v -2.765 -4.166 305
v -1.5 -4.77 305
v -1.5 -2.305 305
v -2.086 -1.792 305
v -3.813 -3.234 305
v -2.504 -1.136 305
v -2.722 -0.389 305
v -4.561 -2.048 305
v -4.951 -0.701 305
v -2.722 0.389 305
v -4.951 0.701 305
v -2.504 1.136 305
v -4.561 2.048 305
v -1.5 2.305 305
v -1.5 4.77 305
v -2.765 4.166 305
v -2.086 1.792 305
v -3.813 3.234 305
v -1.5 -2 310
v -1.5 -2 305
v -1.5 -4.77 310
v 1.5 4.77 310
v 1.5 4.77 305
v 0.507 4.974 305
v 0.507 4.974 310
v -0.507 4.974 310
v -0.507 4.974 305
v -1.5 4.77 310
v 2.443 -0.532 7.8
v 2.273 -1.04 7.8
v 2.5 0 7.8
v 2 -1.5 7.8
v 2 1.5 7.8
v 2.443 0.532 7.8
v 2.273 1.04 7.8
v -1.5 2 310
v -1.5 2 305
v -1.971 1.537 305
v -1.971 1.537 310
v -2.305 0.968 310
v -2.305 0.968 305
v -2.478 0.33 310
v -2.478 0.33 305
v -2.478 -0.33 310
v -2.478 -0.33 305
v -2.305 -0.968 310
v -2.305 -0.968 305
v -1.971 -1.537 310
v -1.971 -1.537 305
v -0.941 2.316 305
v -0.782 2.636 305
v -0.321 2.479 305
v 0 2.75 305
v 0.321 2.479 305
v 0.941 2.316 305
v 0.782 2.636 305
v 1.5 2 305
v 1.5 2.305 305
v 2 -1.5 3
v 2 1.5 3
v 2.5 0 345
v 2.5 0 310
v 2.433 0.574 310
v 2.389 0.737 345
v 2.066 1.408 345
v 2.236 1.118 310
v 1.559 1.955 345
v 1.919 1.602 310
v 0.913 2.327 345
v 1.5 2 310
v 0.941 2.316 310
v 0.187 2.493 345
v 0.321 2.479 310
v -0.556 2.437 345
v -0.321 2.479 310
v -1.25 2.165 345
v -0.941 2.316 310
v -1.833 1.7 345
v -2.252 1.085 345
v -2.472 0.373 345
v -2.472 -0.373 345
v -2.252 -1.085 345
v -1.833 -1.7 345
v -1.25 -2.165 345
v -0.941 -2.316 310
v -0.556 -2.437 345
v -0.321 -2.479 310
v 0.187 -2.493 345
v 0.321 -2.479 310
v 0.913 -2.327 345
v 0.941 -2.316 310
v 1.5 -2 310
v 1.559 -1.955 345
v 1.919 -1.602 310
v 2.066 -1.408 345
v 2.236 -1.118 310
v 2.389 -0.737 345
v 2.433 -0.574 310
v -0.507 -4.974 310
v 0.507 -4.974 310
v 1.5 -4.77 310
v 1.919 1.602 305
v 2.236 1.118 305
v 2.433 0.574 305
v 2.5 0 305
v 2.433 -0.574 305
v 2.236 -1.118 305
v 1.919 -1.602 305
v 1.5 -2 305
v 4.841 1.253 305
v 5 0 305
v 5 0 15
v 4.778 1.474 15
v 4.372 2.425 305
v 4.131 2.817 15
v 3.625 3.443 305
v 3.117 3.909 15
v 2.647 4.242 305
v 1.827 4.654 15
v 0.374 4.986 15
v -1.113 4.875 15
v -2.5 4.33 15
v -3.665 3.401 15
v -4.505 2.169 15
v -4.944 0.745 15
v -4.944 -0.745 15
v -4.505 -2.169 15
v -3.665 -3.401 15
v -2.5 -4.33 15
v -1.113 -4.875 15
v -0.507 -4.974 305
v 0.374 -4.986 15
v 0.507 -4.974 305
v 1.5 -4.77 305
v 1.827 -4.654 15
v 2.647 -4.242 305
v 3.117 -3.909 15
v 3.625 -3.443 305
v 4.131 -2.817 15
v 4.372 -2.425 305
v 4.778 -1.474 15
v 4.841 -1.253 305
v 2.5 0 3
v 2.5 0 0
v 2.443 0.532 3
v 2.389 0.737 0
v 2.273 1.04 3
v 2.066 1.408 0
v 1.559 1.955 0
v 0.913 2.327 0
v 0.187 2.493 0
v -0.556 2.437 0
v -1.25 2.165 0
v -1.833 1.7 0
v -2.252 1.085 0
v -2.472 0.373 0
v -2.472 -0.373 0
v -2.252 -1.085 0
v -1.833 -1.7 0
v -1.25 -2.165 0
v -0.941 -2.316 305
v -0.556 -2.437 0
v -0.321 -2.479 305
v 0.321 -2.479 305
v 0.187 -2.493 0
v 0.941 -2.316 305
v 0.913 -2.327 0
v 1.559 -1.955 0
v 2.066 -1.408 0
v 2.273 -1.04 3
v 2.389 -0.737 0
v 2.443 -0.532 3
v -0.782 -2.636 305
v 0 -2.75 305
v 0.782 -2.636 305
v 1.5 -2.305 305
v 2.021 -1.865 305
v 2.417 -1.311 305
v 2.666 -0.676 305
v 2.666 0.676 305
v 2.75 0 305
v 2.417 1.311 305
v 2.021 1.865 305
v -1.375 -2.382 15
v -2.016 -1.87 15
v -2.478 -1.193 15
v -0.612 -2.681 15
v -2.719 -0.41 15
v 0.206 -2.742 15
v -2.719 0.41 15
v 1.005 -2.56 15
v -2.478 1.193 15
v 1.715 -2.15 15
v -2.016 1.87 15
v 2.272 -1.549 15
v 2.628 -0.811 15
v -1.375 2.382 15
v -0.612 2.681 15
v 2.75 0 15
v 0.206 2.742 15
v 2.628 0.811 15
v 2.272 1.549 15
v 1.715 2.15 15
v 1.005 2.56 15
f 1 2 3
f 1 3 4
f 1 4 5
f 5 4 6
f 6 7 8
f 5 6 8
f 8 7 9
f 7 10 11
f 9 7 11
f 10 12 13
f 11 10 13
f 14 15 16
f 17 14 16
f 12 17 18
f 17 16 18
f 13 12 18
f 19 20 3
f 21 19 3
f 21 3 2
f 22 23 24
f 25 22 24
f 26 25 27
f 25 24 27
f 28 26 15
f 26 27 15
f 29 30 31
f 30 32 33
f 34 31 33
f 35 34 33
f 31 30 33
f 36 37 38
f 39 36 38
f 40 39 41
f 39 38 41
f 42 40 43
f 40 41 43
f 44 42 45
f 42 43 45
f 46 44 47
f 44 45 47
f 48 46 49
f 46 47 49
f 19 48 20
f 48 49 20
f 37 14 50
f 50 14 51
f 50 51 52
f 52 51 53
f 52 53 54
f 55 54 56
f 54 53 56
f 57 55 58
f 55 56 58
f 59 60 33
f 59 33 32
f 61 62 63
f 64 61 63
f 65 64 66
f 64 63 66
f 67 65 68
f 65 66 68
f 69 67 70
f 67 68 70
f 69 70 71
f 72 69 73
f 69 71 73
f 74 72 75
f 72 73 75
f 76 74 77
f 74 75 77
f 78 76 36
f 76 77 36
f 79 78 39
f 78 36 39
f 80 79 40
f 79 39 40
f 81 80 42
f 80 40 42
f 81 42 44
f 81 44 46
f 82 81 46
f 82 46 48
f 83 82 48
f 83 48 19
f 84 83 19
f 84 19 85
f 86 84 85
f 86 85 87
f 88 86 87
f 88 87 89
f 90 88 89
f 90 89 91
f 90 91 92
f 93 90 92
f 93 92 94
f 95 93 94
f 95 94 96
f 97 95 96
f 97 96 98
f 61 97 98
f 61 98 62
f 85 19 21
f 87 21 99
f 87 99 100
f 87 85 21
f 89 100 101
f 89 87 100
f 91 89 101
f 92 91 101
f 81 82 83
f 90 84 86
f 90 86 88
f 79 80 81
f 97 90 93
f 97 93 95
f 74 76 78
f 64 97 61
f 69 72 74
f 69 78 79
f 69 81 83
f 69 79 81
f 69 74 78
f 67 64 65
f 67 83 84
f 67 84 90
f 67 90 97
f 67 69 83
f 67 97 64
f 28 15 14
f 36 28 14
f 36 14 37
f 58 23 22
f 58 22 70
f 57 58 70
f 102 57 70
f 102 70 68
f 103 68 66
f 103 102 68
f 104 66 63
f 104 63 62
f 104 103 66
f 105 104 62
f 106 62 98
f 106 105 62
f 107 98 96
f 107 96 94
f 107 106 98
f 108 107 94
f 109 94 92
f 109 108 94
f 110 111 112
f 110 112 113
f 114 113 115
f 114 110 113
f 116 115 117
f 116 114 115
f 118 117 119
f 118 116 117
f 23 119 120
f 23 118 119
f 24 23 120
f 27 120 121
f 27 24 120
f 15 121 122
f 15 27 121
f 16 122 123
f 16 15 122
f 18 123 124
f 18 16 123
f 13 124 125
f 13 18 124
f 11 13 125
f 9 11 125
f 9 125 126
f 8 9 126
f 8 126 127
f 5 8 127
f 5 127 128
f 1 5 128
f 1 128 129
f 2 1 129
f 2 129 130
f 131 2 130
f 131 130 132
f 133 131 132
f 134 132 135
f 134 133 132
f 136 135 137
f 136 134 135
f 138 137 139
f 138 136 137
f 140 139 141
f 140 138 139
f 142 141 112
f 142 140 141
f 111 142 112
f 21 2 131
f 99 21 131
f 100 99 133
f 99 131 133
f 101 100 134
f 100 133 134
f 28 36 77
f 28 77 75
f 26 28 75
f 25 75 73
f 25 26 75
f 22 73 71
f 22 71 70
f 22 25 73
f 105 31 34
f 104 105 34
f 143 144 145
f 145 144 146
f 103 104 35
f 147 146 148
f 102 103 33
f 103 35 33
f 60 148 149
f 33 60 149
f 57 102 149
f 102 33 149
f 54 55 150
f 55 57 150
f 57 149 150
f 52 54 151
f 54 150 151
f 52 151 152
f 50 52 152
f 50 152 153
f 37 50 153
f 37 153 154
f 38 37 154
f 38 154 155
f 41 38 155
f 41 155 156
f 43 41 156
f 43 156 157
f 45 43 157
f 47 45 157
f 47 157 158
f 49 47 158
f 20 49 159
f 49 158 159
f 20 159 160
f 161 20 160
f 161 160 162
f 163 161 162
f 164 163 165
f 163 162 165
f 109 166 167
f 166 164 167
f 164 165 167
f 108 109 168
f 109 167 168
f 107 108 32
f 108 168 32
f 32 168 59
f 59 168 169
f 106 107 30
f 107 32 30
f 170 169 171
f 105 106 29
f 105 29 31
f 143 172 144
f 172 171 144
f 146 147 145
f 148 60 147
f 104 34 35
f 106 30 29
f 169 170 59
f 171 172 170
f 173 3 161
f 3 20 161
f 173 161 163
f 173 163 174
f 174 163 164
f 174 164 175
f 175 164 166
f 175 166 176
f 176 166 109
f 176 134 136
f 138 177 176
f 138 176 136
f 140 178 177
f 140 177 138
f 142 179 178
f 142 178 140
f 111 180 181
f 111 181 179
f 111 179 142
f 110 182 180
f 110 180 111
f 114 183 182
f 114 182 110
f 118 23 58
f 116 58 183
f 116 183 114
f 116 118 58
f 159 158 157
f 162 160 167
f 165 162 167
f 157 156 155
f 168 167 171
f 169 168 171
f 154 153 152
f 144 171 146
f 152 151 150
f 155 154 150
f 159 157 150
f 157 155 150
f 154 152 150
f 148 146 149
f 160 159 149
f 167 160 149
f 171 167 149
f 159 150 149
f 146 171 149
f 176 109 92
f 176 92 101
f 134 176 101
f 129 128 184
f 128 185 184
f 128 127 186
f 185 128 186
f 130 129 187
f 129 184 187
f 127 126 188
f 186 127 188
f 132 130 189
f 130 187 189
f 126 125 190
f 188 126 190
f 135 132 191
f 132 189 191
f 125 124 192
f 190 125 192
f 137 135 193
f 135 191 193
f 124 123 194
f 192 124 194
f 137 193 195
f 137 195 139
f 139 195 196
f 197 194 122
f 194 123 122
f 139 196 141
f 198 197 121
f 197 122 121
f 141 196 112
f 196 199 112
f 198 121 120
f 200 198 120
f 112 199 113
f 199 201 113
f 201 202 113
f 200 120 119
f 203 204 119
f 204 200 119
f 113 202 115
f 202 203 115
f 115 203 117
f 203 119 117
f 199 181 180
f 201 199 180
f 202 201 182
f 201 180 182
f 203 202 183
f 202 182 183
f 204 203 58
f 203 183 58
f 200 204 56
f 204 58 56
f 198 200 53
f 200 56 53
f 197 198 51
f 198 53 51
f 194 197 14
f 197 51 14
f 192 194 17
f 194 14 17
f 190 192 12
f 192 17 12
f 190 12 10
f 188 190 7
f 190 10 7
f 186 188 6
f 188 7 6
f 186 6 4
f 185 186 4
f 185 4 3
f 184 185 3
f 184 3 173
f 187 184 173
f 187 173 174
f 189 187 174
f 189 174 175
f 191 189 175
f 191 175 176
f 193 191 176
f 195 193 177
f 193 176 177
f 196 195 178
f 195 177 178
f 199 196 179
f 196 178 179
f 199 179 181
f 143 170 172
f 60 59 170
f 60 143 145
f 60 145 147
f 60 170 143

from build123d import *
from build123d.topology import SkipClean

# Parameters (mm, degrees)
SKETCH_1_R          = 2.5
EXTRUDE_1_DEPTH     = 345
CUT_EXTRUDE_1_DEPTH = 4.8
SKETCH_3_R          = 5
SKETCH_3_R_2        = 2.75
EXTRUDE_2_DEPTH     = 290
SKETCH_4_R          = 5
EXTRUDE_3_DEPTH     = 5
CUT_EXTRUDE_START   = -5
CUT_EXTRUDE_2_DEPTH = 5


with BuildPart() as part:
    # 草图1 → 凸台-拉伸1 (new body)
    with BuildSketch(Plane.XY):
        Circle(SKETCH_1_R)
    extrude(amount=EXTRUDE_1_DEPTH)

    # 草图2 → 切除-拉伸1 (cut)
    with BuildSketch(Plane(origin=(0, 0, 3), x_dir=(-1, 0, 0), z_dir=(0, 0, -1))):
        with BuildLine():
            Line((-2, 1.5), (-2, -1.5))
            ThreePointArc((-2, -1.5), (-2.5, 0), (-2, 1.5))
        make_face()
    extrude(amount=-CUT_EXTRUDE_1_DEPTH, mode=Mode.SUBTRACT)



with BuildPart() as body_2:
    # 草图3 → 凸台-拉伸2 (new body)
    with BuildSketch(Plane.XY.offset(305)):
        Circle(SKETCH_3_R)
        Circle(SKETCH_3_R_2, mode=Mode.SUBTRACT)
    extrude(amount=-EXTRUDE_2_DEPTH)


with BuildPart() as part_1:
    add(part.part)

    add(body_2.part)  # 凸台-拉伸3 merges body 2
    # 草图4 → 凸台-拉伸3 (add)
    with BuildSketch(Plane.XY.offset(305)):
        Circle(SKETCH_4_R)
    extrude(amount=EXTRUDE_3_DEPTH)

    # 草图5 → 切除-拉伸2 (cut)
    with SkipClean():  # the faces are left unmerged after this step: merging them gives an invalid solid
        with BuildSketch(Plane.XY.offset(310).offset(CUT_EXTRUDE_START)):
            with BuildLine():
                Line((-1.5, 4.769696007), (-1.5, 2))
                ThreePointArc((-1.5, 2), (-2.5, 0), (-1.5, -2))
                Line((-1.5, -2), (-1.5, -4.769696007))
                ThreePointArc((-1.5, -4.769696007), (-5, 0), (-1.5, 4.769696007))
            make_face()
            with BuildLine():
                Line((1.5, 4.769696007), (1.5, 2))
                ThreePointArc((1.5, 2), (2.5, 0), (1.5, -2))
                Line((1.5, -2), (1.5, -4.769696007))
                ThreePointArc((1.5, -4.769696007), (5, 0), (1.5, 4.769696007))
            make_face()
        extrude(amount=CUT_EXTRUDE_2_DEPTH, mode=Mode.SUBTRACT)


solid = part_1.part
